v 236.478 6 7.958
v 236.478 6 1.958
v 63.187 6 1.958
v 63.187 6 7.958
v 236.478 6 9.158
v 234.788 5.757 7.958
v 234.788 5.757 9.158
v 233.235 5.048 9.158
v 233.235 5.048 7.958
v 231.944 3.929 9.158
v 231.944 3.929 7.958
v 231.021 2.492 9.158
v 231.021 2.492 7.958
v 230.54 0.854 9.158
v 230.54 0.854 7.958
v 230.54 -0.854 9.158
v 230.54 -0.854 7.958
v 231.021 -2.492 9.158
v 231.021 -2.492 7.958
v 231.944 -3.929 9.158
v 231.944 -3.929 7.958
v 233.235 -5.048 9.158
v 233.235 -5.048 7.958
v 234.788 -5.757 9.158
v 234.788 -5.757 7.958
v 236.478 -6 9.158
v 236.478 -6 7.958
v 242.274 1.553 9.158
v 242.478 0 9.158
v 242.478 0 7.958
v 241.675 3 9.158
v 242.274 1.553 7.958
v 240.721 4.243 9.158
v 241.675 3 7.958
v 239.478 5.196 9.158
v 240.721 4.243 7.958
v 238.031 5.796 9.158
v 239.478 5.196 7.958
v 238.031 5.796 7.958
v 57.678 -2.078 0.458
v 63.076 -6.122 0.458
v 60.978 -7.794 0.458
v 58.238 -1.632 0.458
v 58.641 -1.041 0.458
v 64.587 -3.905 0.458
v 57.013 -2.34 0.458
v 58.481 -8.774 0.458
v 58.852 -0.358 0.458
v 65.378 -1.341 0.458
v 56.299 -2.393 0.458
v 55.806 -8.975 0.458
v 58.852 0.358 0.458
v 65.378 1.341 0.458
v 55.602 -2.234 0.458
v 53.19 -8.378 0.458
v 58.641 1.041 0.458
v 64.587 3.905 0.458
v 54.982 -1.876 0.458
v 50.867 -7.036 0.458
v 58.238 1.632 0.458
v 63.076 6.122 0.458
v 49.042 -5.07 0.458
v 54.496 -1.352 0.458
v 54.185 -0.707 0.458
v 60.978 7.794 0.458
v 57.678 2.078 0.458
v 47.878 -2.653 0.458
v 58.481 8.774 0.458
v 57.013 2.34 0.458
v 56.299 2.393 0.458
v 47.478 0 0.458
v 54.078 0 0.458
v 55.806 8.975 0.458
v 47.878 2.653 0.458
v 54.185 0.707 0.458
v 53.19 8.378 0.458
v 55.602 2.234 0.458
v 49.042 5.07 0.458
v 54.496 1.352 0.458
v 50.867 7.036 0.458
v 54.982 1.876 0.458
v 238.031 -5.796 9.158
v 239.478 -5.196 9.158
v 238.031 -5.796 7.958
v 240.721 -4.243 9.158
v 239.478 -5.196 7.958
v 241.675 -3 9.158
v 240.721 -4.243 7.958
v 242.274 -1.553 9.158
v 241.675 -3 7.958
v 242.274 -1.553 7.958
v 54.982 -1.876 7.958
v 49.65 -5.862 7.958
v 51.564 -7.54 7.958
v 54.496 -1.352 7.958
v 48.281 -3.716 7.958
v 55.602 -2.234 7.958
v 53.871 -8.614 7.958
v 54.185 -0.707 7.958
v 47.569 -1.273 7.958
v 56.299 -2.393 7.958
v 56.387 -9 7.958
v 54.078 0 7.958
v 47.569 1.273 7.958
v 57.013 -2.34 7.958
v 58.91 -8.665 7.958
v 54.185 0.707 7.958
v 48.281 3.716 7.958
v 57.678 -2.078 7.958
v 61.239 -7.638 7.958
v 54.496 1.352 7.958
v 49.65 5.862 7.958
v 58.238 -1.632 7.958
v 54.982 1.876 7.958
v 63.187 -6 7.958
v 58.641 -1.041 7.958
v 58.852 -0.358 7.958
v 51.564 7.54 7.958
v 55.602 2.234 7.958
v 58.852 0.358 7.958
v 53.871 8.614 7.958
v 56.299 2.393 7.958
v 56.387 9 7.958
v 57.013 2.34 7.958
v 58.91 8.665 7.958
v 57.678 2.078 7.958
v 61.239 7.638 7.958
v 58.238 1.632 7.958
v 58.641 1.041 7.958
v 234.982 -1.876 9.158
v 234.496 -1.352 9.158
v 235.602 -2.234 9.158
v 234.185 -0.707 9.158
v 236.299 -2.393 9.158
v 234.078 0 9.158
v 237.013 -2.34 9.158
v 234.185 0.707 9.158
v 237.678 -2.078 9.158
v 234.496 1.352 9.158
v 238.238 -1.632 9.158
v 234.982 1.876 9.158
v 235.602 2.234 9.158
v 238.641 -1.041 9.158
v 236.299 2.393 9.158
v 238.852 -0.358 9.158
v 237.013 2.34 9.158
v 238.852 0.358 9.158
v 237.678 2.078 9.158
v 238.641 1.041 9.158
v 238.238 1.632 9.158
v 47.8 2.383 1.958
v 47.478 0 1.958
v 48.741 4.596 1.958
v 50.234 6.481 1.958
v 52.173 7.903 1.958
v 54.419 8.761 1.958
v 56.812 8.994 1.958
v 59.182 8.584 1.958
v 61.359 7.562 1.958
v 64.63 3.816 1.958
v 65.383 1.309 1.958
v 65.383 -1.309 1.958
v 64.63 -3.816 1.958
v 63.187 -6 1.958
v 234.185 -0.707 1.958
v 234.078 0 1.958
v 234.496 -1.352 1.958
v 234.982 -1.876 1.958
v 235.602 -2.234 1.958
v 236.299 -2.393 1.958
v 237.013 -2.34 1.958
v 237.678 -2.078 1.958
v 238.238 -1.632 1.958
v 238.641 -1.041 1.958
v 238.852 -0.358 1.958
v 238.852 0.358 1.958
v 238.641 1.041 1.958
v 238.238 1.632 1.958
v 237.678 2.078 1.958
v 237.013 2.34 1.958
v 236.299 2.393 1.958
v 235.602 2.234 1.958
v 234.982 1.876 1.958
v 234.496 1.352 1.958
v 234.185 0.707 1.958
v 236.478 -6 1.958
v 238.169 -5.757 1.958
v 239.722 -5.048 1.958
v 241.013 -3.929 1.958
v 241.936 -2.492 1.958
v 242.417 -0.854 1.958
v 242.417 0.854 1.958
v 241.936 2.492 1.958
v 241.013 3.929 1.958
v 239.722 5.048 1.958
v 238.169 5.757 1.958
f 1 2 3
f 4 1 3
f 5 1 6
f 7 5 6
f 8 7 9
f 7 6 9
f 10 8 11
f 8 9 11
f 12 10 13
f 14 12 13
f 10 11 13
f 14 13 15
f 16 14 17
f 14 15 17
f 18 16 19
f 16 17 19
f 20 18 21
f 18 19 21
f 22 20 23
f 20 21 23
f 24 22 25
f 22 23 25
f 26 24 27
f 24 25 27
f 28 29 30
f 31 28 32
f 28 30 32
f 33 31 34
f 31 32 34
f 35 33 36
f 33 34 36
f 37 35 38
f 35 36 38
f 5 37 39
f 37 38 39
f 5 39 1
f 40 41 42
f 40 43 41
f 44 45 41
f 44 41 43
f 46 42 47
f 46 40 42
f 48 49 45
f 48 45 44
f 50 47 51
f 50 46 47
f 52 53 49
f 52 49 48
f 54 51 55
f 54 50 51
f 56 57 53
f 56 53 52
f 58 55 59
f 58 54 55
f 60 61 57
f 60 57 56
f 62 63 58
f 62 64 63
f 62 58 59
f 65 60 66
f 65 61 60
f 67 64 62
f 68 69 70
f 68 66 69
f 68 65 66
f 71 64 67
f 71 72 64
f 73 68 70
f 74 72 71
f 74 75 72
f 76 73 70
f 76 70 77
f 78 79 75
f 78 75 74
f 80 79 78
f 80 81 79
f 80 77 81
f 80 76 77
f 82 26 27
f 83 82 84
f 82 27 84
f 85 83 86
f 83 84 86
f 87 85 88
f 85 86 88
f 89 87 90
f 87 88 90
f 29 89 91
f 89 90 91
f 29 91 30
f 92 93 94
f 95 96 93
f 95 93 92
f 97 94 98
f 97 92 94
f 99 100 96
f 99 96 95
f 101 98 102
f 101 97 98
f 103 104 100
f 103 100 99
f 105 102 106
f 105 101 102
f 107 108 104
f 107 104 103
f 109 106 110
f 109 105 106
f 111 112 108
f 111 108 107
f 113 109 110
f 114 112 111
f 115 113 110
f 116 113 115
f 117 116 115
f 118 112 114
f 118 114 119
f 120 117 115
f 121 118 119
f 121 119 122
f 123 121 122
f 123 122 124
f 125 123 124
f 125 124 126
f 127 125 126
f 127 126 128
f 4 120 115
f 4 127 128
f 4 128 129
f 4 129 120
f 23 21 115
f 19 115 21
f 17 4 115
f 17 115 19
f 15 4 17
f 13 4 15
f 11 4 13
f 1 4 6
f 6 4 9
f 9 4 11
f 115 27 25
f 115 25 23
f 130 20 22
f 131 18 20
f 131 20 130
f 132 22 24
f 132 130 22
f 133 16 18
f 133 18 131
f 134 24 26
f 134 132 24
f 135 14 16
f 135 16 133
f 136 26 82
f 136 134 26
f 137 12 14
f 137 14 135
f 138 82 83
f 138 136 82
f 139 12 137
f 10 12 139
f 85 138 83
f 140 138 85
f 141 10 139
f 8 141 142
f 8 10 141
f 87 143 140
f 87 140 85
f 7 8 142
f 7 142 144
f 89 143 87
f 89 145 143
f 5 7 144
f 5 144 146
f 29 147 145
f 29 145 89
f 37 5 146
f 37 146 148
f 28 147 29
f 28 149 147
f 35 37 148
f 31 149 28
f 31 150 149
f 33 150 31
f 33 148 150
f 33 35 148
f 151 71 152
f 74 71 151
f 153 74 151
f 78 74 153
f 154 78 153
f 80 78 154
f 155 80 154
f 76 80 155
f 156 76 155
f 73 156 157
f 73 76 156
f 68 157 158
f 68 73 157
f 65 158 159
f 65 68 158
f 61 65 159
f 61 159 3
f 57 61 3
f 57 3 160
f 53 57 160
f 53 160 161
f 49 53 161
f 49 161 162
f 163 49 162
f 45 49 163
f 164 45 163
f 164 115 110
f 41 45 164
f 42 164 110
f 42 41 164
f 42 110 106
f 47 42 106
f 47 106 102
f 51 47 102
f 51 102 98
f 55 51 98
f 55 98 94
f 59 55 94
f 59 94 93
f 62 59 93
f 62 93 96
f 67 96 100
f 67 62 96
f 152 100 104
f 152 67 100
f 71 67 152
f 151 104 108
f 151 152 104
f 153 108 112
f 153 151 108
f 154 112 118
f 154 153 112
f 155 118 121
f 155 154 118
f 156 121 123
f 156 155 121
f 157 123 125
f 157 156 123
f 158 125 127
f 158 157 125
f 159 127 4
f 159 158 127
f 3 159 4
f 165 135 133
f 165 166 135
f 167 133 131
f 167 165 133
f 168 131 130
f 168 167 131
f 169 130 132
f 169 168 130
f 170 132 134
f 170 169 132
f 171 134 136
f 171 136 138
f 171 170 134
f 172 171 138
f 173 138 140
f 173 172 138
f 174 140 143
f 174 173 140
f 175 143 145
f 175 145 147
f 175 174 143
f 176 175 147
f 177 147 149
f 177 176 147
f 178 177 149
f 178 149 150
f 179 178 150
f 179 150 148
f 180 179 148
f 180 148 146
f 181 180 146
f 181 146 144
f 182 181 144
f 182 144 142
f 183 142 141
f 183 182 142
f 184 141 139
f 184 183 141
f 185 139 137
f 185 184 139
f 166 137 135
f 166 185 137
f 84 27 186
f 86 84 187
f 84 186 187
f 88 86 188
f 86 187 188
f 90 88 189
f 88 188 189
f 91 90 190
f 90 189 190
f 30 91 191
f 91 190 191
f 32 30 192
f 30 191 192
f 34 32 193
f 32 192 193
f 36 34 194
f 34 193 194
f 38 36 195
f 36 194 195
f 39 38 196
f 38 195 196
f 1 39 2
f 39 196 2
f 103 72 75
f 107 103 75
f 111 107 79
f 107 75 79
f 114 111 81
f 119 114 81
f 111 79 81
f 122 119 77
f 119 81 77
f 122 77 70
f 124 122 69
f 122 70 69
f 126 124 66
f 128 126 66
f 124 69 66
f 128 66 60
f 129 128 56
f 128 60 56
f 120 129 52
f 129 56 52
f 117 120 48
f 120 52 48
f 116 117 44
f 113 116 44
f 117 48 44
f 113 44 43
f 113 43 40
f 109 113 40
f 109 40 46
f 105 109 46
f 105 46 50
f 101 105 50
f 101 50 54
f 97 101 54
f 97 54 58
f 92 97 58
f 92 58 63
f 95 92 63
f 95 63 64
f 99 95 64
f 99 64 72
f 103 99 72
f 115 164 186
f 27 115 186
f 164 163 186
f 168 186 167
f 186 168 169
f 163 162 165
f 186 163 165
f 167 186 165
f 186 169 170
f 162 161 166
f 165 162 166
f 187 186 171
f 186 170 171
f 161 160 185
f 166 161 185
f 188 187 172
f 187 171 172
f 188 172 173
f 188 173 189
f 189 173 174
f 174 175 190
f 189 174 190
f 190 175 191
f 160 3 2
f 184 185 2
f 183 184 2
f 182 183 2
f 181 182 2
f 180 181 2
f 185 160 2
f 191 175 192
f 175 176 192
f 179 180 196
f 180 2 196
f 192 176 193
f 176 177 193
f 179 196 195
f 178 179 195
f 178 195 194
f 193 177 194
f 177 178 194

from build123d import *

# Parameters (mm, degrees)
SKETCH1_R             = 15
BOSS_EXTRUDE1_DEPTH   = 10
SKETCH1_R_2           = 10
BOSS_EXTRUDE1_2_DEPTH = 10
BOSS_EXTRUDE3_DEPTH   = 10
SKETCH13_R            = 4
CUT_EXTRUDE1_DEPTH    = 20
BOSS_EXTRUDE7_START   = 2.5
SKETCH14_R            = 15
SKETCH14_R_2          = 4
BOSS_EXTRUDE7_DEPTH   = 2.5
SKETCH15_R            = 4
BOSS_EXTRUDE8_DEPTH   = 2
ECHELLE1_SCALE        = 0.6


with BuildPart() as part:
    # Sketch1 → Boss-Extrude1 (new body)
    with BuildSketch(Plane.XY):
        Circle(SKETCH1_R)
    extrude(amount=BOSS_EXTRUDE1_DEPTH)



with BuildPart() as body_2:
    # Sketch1 → Boss-Extrude1 2 (new body)
    with BuildSketch(Plane.XY):
        with Locations((300, 0)):
            Circle(SKETCH1_R_2)
    extrude(amount=BOSS_EXTRUDE1_2_DEPTH)


with BuildPart() as part_1:
    add(part.part)

    add(body_2.part)  # Boss-Extrude3 merges body 2
    # Sketch5 → Boss-Extrude3 (add)
    with BuildSketch(Plane.XY):
        with BuildLine():
            Line((300, 10), (11.180339887, 10))
            ThreePointArc((11.180339887, 10), (14.012585384, 5.352331347), (15, 0))
            ThreePointArc((15, 0), (14.012585384, -5.352331347), (11.180339887, -10))
            Line((11.180339887, -10), (300, -10))
            ThreePointArc((300, -10), (290, 0), (300, 10))
        make_face()
    extrude(amount=BOSS_EXTRUDE3_DEPTH)

    # Sketch13 → Cut-Extrude1 (cut)
    with BuildSketch(Plane(origin=(0, 0, 0), x_dir=(-1, 0, 0), z_dir=(0, 0, -1))):
        with Locations((-300, 0)):
            Circle(SKETCH13_R)
        Circle(SKETCH13_R)
    extrude(amount=-CUT_EXTRUDE1_DEPTH, mode=Mode.SUBTRACT)

    # Sketch14 → Boss-Extrude7 (add)
    with BuildSketch(Plane(origin=(0, 0, 0), x_dir=(-1, 0, 0), z_dir=(0, 0, -1)).offset(BOSS_EXTRUDE7_START)):
        Circle(SKETCH14_R)
        Circle(SKETCH14_R_2, mode=Mode.SUBTRACT)
    extrude(amount=-BOSS_EXTRUDE7_DEPTH)

    # Sketch15 → Boss-Extrude8 (add)
    with BuildSketch(Plane.XY.offset(10)):
        with BuildLine():
            ThreePointArc((300, 10), (290, 0), (300, -10))
            ThreePointArc((300, -10), (307.071067812, -7.071067812), (310, 0))
            ThreePointArc((310, 0), (307.071067812, 7.071067812), (300, 10))
        make_face()
        with Locations(Location((300, 0, 0), (0, 0, 180))):
            Circle(SKETCH15_R, mode=Mode.SUBTRACT)
    extrude(amount=BOSS_EXTRUDE8_DEPTH)


with BuildPart() as part_2:
    # Echelle1: scaled about (141.196241325, 0, 4.894209778)
    add(part_1.part.scale(ECHELLE1_SCALE).moved(Location((56.47849653, 0, 1.957683911))))


solid = part_2.part
